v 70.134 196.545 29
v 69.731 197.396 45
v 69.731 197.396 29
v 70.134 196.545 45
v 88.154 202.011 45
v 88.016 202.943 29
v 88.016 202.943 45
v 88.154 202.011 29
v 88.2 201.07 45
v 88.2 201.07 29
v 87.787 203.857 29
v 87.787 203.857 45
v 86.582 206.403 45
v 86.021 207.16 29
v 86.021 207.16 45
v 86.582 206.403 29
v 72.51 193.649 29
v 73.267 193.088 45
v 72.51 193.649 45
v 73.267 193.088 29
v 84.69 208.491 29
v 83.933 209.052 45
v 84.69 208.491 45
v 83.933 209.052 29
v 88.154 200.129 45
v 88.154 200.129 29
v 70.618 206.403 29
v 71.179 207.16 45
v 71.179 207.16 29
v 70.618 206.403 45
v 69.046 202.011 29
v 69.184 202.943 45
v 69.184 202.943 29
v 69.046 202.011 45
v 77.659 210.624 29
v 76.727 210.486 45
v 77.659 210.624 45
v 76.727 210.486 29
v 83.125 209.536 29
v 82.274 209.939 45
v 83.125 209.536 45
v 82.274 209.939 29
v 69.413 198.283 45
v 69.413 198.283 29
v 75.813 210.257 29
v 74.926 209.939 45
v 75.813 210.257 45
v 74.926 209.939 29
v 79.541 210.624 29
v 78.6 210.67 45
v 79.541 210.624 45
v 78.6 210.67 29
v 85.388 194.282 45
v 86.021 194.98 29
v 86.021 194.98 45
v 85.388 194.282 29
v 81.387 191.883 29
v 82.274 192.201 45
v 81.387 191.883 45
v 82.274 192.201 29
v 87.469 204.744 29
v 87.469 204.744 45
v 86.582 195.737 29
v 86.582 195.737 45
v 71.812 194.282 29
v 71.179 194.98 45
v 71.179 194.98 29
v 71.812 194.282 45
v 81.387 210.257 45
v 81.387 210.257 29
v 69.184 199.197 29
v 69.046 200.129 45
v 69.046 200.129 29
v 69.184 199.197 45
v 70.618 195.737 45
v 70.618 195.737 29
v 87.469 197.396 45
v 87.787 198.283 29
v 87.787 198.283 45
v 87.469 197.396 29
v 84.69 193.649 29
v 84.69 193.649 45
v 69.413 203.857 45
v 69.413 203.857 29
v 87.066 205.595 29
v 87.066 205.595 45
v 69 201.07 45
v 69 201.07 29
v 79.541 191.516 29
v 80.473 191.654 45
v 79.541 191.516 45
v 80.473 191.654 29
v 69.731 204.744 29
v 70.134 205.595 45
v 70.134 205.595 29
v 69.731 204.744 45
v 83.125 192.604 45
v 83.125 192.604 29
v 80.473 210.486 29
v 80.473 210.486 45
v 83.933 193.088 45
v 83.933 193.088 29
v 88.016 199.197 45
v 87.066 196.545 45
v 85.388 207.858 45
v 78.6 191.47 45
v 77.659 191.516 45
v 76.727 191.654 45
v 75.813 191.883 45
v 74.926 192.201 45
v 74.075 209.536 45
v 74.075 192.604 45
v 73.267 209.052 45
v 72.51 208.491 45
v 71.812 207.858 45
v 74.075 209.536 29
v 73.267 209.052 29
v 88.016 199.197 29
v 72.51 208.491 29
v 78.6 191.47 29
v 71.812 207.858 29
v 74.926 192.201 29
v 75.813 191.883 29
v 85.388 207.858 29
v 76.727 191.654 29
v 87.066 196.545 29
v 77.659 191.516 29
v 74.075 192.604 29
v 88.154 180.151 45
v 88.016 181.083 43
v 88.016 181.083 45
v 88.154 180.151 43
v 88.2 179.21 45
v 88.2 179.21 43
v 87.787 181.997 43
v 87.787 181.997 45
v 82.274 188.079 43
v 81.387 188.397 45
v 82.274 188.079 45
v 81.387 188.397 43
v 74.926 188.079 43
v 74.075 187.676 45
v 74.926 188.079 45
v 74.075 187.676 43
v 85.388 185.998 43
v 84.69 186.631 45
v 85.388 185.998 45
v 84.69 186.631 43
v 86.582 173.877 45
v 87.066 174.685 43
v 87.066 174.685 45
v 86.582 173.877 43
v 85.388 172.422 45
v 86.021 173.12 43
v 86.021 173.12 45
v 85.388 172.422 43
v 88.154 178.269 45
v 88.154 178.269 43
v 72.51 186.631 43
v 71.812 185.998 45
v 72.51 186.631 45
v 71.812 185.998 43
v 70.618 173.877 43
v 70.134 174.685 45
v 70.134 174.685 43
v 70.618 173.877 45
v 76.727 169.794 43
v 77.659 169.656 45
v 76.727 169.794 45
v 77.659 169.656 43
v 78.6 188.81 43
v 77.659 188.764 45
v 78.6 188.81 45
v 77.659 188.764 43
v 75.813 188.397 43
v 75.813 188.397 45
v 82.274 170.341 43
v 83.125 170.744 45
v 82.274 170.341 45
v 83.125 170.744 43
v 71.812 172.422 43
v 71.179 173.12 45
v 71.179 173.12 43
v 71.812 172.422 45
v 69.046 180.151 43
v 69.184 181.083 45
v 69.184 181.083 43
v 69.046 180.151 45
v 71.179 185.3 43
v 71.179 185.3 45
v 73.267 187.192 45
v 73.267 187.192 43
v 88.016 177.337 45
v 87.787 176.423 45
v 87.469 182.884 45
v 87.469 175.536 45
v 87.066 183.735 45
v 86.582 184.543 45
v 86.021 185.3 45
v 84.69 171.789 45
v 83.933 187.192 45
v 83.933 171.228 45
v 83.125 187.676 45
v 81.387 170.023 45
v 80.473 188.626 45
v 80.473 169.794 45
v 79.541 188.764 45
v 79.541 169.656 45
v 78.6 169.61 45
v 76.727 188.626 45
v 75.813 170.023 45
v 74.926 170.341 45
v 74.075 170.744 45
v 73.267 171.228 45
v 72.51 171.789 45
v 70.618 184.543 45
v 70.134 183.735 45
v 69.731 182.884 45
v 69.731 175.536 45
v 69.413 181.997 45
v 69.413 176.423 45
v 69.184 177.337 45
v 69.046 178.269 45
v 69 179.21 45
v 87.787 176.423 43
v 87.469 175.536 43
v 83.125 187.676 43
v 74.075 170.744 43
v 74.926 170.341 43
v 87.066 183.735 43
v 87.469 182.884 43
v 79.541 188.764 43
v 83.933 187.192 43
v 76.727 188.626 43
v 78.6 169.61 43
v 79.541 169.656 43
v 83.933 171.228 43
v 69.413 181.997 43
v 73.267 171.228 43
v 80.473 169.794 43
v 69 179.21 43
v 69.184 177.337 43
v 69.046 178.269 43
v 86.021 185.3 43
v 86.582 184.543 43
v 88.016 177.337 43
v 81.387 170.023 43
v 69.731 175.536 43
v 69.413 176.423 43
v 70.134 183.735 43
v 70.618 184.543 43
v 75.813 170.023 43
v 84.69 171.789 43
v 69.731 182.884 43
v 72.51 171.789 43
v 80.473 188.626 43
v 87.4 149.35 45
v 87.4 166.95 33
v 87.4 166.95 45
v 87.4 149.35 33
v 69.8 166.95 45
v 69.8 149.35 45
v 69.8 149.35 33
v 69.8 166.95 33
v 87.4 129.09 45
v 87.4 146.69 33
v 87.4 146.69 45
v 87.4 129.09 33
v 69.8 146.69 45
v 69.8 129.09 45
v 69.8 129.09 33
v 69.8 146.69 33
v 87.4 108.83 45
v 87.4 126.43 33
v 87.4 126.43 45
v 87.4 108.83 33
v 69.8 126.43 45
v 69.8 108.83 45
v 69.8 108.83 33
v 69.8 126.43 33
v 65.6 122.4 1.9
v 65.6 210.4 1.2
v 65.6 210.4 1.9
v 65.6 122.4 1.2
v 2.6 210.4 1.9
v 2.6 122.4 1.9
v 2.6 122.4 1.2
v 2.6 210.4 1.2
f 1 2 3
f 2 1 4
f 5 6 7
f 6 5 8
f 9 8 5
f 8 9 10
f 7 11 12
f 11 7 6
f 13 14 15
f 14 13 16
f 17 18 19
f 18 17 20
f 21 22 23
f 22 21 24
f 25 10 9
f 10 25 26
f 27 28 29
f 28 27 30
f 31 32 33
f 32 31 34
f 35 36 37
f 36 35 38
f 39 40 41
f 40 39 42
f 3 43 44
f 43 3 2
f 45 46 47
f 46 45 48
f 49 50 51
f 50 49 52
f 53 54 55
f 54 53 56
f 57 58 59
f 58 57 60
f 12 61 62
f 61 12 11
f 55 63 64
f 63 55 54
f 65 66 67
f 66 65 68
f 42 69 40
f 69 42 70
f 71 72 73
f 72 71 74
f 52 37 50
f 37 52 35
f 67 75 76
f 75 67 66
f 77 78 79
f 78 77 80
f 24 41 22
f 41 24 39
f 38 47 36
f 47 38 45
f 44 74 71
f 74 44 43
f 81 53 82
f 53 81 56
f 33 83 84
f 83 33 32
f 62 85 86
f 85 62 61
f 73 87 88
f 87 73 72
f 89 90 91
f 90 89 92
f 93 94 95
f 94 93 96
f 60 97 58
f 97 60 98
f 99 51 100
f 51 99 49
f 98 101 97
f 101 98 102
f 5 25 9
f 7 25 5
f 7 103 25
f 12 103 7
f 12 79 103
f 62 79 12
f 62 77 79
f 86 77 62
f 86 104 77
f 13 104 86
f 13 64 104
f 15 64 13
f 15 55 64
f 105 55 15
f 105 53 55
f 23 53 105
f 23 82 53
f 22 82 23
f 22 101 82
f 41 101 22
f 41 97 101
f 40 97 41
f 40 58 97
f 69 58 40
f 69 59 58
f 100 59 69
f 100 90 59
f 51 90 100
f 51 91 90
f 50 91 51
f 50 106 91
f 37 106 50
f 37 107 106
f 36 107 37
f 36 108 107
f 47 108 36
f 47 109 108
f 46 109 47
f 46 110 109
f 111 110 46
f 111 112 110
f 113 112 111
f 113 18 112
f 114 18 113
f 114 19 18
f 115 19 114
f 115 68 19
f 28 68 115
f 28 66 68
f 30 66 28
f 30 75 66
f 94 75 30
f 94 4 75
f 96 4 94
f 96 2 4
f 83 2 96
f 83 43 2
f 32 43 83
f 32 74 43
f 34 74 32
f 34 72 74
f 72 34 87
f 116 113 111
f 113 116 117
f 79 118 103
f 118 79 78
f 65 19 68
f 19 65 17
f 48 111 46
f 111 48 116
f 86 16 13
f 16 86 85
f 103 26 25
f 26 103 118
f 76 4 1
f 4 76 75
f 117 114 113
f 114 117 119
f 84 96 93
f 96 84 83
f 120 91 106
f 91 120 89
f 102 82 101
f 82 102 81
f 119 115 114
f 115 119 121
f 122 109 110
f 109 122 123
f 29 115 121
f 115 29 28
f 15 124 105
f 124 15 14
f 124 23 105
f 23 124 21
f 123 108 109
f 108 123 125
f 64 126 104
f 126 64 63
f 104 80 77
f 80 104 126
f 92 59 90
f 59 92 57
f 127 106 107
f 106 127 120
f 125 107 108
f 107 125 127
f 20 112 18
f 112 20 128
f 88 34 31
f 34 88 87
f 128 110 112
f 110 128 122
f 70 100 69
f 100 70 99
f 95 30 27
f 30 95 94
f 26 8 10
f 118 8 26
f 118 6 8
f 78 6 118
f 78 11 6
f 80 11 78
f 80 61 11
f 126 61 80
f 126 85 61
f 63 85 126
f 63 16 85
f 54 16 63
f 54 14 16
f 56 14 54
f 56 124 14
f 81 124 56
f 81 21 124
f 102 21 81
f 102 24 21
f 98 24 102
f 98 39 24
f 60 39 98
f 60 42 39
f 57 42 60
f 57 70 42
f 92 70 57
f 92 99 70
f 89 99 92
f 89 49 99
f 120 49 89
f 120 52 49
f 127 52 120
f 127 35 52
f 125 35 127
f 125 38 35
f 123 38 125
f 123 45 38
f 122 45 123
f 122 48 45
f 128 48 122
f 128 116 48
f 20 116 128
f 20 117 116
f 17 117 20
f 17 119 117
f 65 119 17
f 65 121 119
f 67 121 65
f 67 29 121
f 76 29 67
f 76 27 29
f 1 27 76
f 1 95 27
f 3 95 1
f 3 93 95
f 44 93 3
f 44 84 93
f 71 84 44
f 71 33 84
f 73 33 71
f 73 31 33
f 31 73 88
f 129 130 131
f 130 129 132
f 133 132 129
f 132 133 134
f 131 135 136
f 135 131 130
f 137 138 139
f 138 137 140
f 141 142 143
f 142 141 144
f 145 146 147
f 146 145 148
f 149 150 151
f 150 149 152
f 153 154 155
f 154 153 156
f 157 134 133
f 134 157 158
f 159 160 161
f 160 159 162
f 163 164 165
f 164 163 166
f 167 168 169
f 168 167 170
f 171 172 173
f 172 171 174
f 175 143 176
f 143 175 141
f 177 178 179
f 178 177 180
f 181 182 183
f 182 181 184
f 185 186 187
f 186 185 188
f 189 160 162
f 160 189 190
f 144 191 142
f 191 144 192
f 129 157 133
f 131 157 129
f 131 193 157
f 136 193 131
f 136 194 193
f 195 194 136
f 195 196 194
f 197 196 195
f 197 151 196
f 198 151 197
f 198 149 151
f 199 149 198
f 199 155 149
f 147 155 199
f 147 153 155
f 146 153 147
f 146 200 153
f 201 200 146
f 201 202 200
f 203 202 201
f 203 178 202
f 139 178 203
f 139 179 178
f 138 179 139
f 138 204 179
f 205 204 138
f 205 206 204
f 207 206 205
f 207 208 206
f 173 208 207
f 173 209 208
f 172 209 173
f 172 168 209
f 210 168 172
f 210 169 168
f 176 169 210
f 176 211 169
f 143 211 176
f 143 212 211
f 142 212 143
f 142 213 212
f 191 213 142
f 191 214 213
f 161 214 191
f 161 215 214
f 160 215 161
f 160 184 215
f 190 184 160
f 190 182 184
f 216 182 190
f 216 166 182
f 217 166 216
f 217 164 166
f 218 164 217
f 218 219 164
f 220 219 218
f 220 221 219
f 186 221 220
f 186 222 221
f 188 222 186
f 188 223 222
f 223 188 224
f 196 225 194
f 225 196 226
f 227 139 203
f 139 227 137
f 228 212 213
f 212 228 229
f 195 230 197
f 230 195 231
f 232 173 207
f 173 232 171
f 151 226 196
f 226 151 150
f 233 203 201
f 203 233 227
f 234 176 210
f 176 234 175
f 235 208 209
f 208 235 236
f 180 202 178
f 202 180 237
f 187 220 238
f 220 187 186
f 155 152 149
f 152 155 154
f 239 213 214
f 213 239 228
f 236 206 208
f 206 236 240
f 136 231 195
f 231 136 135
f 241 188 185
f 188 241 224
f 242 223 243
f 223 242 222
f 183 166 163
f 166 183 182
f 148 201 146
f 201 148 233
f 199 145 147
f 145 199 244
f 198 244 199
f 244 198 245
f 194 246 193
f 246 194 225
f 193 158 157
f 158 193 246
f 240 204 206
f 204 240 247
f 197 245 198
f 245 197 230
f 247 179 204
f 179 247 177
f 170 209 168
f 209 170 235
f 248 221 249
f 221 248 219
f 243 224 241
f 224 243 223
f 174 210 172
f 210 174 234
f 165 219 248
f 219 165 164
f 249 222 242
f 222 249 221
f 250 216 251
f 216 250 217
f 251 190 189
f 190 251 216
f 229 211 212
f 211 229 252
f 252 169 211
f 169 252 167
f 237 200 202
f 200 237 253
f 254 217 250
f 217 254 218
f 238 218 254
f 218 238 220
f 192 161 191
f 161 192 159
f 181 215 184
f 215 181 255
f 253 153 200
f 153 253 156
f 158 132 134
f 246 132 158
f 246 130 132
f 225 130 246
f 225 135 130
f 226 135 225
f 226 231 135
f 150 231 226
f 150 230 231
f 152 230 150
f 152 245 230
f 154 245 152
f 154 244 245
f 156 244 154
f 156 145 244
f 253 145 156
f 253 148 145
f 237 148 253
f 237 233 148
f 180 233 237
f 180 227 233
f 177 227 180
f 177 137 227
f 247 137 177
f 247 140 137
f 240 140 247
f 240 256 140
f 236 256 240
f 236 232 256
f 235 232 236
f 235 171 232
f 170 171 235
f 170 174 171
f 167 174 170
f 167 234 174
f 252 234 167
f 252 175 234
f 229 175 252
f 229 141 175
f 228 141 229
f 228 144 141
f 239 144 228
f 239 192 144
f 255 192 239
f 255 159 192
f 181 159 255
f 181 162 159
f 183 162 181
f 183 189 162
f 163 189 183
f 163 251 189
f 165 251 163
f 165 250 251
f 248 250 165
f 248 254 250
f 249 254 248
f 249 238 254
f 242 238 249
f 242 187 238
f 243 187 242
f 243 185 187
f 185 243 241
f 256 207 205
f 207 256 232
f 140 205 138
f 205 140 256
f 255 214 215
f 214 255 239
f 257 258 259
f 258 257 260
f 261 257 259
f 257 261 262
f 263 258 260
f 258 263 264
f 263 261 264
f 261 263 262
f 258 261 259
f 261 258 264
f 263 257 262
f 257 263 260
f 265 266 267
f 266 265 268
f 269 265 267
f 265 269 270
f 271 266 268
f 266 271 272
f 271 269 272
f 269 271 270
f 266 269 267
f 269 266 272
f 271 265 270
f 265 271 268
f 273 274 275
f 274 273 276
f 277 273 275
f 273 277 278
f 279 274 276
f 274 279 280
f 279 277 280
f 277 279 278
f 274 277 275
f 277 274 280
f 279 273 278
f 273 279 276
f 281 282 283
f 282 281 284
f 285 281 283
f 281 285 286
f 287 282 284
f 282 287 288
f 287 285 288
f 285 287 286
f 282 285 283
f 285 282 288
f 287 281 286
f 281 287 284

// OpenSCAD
// file: ../lib/faction-layout.scad
// Shared layout for the faction box and its contents: token pockets, card slot, shelf.
include <../constants.scad>

function sum(v, i = 0) = i >= len(v) ? 0 : v[i] + sum(v, i + 1);
function token_size(t) = t[0] == "round" ? round_token_d : square_tile;

// Pockets along the token column, from the back wall forward: [[y_start, length], ...].
// Spare column length is shared out as clearance, up to token_pocket_clr_max per pocket;
// anything left over becomes a spare compartment at the front.
function token_pockets(f) =
    let (
        toks = faction_tokens(f),
        n = len(toks),
        sizes = [for (t = toks) token_size(t)],
        free = column_l - sum(sizes) - (n - 1) * divider_t,
        extra = min(free / n, token_pocket_clr_max),
        lens = [for (s = sizes) s + extra],
        ends = [for (i = [0 : n - 1]) faction_box_d - wall - (i == 0 ? 0 : sum([for (j = [0 : i - 1]) lens[j]]) + i * divider_t)]
    )
    assert(free >= 0, str(f, ": token stacks don't fit in the column"))
    [for (i = [0 : n - 1]) [ends[i] - lens[i], lens[i]]];

function spare_length(f) =
    let (p = token_pockets(f), last = p[len(p) - 1])
    last[0] - divider_t - wall;

// The box is two open cups glued together: the base (card slot) and the top (warriors + tokens).
function slot_height(f) = faction_cards_h(f) + slot_headroom;
function base_h(f) = floor_t + slot_height(f);       // base height = where the top piece starts
function top_floor_z(f) = base_h(f) + floor_t;       // floor of the warrior bin

// Pocket floor height: the stack's top ends token_headroom below the rim.
function pocket_floor_z(f, t) = max(top_floor_z(f), faction_box_h - t[1] * token_t - token_headroom);

// Alignment pins: in the token column, near the front and back walls. On the base they stand
// on its flat top; in the top piece the holes go up into posts inside the pocket hollows.
function pin_positions() = [
    [column_x + column_w / 2, wall + pin_inset],
    [column_x + column_w / 2, faction_box_d - wall - pin_inset],
];
function boss_d() = pin_d + pin_fit + 2 * boss_wall;
function boss_top(f) = base_h(f) + pin_h + pin_hole_extra + floor_t;   // hole depth + a 1.2 mm cap

// Each pin's post must fit under the raised floor of the pocket above it (or in the open spare compartment).
function pin_post_fits(f) =
    let (toks = faction_tokens(f), p = token_pockets(f))
    [for (pos = pin_positions())
        let (hits = [for (i = [0 : len(p) - 1]) if (pos[1] >= p[i][0] && pos[1] <= p[i][0] + p[i][1]) i])
        len(hits) == 0 || boss_top(f) <= pocket_floor_z(f, toks[hits[0]]) - pocket_floor_t];
// file: ../constants.scad
// Root (base game) insert. All sizes in mm; see README.md for where the numbers come from.
// Coordinates: x along the box's long side (279), y toward the back of the box, z up.

eps = 0.01;

// ---- Box (measured) ----
box_inner_w = 279;      // cavity, long side
box_inner_d = 216;      // cavity, short side
box_inner_h = 71;       // lower box, floor to wall top
board_stack_h = 24;     // map + 4 faction boards + Law of Root + sheet + Learning to Play
lid_clearance = 1;      // so the box lid closes without pressing

// ---- Insert envelope ----
insert_w = 276;
insert_d = 213;
insert_h = box_inner_h - board_stack_h - lid_clearance;   // 46

// ---- Components (measured) ----
card_w = 63;
card_l = 88;
card_t = 0.35;          // per card (54-card deck = 19 mm)
square_tile = 17.6;     // buildings, roosts, bases, ruins, items, score, relationship
round_token_d = 19.2;   // wood, keep, sympathy
token_t = 2;
warrior_t = 8.9;        // all warriors and the pawn are ~8.9 thick

// Faction card stacks (walkthrough/reference/faction cards)
marquise_cards_h = 0.7;
eyrie_cards_h = 3.8;
alliance_cards_h = 0.7;
vagabond_cards_h = 8.2;

// ---- Tray construction ----
wall = 1.6;
floor_t = 1.2;
divider_t = 1.2;
card_clr = 1;            // around the cards, each side
slot_headroom = 0.8;     // above the card stack in the side-loading slot
token_pocket_clr_max = 3;   // pockets get the column's spare length, up to this much extra
token_headroom = 1;      // token stacks stop this far below the rim (the board stack caps the trays)
pocket_floor_t = 1.2;    // raised pocket floor; hollow underneath
finger_notch_w = 14;     // notch in the outer wall beside each token pocket
finger_notch_keep = 2;   // wall left above the pocket floor (holds the bottom token)
card_push_hole_d = 16;   // under the closed end of the card slot: push the cards out

// ---- Base-to-top joint: two pins on the base, two holes in the top (press fit, tune by test print) ----
pin_d = 5;
pin_h = 4;
pin_chamfer = 0.6;       // lead-in on the pin tip
pin_fit = 0.15;          // hole diameter over pin diameter (FDM holes print a little small)
pin_hole_extra = 0.4;    // hole deeper than the pin, so the faces seat flush
pin_hole_chamfer = 0.4;  // at the hole mouth (bed side): room for elephant's foot
pin_inset = 10;          // pin centres from the inside of the front/back walls
boss_wall = 1.6;         // around each hole, inside the top piece's token-column hollows
pinch_notch_w = 30;      // U-notch in the floor at the card slot opening
pinch_notch_l = 14;

// No lids: in the box, the board stack lies across every tray within ~1 mm of the tops,
// which is too small a gap for a 2 mm token or a warrior.

// ---- Faction box (all four share one size) ----
faction_box_w = 91;
faction_box_d = 106.5;
faction_box_h = insert_h;                    // 46
card_slot_w = card_w + 2 * card_clr;         // 65
card_slot_l = card_l + 2 * card_clr;         // 90
bin_w = card_slot_w;                         // warrior bin sits on the shelf, same width as the cards
column_x = wall + bin_w + divider_t;         // token column starts here
column_w = faction_box_w - column_x - wall;  // 21.6
column_l = faction_box_d - 2 * wall;         // 103.3

// ---- Per-faction data ----
factions = ["marquise", "eyrie", "alliance", "vagabond"];

function faction_name(f) =
    f == "marquise" ? "MARQUISE" : f == "eyrie" ? "EYRIE" : f == "alliance" ? "ALLIANCE" : "VAGABOND";

function faction_color(f) =
    f == "marquise" ? "#d9782d" : f == "eyrie" ? "#3d6fb4" : f == "alliance" ? "#4e9a48" : "#8b8f88";

function faction_cards_h(f) =
    f == "marquise" ? marquise_cards_h : f == "eyrie" ? eyrie_cards_h
    : f == "alliance" ? alliance_cards_h : vagabond_cards_h;

// Token stacks in the column, listed from the back of the box forward: [shape, count]
function faction_tokens(f) =
    f == "marquise" ? [["round", 8], ["round", 1], ["square", 6], ["square", 6], ["square", 6]]   // wood, keep, sawmills, workshops, recruiters
    : f == "eyrie" ? [["square", 7]]                                                              // roosts
    : f == "alliance" ? [["round", 10], ["square", 3]]                                           // sympathy, bases
    : [["square", 3]];                                                                           // relationship markers

// Where each box sits in the insert (2 x 2 block on the left; shared trays on the right)
function faction_pos(f) =
    f == "marquise" ? [0, insert_d - faction_box_d, 0]
    : f == "eyrie" ? [faction_box_w, insert_d - faction_box_d, 0]
    : f == "alliance" ? [0, 0, 0]
    : [faction_box_w, 0, 0];
// main file
// Faction cards and token stacks at measured size, sitting where they're stored. Fit checks only.
include <../constants.scad>
use <../lib/faction-layout.scad>

faction = "marquise";
in_layout = true;
show = "all";   // "cards", "tokens" or "all"

module faction_contents(f, show = "all") {
    // card stack in the slot
    if (show != "tokens") translate([wall + card_clr, faction_box_d - wall - card_slot_l + card_clr, floor_t])
        cube([card_w, card_l, faction_cards_h(f)]);
    // token stacks, centred in their pockets, on the raised floors
    toks = faction_tokens(f);
    p = token_pockets(f);
    if (show != "cards") for (i = [0 : len(toks) - 1]) {
        h = toks[i][1] * token_t;
        translate([column_x + column_w / 2, p[i][0] + p[i][1] / 2, pocket_floor_z(f, toks[i])])
            if (toks[i][0] == "round") cylinder(d = round_token_d, h = h, $fn = 64);
            else translate([-square_tile / 2, -square_tile / 2, 0]) cube([square_tile, square_tile, h]);
    }
}

translate(in_layout ? faction_pos(faction) : [0, 0, 0]) faction_contents(faction, show);
